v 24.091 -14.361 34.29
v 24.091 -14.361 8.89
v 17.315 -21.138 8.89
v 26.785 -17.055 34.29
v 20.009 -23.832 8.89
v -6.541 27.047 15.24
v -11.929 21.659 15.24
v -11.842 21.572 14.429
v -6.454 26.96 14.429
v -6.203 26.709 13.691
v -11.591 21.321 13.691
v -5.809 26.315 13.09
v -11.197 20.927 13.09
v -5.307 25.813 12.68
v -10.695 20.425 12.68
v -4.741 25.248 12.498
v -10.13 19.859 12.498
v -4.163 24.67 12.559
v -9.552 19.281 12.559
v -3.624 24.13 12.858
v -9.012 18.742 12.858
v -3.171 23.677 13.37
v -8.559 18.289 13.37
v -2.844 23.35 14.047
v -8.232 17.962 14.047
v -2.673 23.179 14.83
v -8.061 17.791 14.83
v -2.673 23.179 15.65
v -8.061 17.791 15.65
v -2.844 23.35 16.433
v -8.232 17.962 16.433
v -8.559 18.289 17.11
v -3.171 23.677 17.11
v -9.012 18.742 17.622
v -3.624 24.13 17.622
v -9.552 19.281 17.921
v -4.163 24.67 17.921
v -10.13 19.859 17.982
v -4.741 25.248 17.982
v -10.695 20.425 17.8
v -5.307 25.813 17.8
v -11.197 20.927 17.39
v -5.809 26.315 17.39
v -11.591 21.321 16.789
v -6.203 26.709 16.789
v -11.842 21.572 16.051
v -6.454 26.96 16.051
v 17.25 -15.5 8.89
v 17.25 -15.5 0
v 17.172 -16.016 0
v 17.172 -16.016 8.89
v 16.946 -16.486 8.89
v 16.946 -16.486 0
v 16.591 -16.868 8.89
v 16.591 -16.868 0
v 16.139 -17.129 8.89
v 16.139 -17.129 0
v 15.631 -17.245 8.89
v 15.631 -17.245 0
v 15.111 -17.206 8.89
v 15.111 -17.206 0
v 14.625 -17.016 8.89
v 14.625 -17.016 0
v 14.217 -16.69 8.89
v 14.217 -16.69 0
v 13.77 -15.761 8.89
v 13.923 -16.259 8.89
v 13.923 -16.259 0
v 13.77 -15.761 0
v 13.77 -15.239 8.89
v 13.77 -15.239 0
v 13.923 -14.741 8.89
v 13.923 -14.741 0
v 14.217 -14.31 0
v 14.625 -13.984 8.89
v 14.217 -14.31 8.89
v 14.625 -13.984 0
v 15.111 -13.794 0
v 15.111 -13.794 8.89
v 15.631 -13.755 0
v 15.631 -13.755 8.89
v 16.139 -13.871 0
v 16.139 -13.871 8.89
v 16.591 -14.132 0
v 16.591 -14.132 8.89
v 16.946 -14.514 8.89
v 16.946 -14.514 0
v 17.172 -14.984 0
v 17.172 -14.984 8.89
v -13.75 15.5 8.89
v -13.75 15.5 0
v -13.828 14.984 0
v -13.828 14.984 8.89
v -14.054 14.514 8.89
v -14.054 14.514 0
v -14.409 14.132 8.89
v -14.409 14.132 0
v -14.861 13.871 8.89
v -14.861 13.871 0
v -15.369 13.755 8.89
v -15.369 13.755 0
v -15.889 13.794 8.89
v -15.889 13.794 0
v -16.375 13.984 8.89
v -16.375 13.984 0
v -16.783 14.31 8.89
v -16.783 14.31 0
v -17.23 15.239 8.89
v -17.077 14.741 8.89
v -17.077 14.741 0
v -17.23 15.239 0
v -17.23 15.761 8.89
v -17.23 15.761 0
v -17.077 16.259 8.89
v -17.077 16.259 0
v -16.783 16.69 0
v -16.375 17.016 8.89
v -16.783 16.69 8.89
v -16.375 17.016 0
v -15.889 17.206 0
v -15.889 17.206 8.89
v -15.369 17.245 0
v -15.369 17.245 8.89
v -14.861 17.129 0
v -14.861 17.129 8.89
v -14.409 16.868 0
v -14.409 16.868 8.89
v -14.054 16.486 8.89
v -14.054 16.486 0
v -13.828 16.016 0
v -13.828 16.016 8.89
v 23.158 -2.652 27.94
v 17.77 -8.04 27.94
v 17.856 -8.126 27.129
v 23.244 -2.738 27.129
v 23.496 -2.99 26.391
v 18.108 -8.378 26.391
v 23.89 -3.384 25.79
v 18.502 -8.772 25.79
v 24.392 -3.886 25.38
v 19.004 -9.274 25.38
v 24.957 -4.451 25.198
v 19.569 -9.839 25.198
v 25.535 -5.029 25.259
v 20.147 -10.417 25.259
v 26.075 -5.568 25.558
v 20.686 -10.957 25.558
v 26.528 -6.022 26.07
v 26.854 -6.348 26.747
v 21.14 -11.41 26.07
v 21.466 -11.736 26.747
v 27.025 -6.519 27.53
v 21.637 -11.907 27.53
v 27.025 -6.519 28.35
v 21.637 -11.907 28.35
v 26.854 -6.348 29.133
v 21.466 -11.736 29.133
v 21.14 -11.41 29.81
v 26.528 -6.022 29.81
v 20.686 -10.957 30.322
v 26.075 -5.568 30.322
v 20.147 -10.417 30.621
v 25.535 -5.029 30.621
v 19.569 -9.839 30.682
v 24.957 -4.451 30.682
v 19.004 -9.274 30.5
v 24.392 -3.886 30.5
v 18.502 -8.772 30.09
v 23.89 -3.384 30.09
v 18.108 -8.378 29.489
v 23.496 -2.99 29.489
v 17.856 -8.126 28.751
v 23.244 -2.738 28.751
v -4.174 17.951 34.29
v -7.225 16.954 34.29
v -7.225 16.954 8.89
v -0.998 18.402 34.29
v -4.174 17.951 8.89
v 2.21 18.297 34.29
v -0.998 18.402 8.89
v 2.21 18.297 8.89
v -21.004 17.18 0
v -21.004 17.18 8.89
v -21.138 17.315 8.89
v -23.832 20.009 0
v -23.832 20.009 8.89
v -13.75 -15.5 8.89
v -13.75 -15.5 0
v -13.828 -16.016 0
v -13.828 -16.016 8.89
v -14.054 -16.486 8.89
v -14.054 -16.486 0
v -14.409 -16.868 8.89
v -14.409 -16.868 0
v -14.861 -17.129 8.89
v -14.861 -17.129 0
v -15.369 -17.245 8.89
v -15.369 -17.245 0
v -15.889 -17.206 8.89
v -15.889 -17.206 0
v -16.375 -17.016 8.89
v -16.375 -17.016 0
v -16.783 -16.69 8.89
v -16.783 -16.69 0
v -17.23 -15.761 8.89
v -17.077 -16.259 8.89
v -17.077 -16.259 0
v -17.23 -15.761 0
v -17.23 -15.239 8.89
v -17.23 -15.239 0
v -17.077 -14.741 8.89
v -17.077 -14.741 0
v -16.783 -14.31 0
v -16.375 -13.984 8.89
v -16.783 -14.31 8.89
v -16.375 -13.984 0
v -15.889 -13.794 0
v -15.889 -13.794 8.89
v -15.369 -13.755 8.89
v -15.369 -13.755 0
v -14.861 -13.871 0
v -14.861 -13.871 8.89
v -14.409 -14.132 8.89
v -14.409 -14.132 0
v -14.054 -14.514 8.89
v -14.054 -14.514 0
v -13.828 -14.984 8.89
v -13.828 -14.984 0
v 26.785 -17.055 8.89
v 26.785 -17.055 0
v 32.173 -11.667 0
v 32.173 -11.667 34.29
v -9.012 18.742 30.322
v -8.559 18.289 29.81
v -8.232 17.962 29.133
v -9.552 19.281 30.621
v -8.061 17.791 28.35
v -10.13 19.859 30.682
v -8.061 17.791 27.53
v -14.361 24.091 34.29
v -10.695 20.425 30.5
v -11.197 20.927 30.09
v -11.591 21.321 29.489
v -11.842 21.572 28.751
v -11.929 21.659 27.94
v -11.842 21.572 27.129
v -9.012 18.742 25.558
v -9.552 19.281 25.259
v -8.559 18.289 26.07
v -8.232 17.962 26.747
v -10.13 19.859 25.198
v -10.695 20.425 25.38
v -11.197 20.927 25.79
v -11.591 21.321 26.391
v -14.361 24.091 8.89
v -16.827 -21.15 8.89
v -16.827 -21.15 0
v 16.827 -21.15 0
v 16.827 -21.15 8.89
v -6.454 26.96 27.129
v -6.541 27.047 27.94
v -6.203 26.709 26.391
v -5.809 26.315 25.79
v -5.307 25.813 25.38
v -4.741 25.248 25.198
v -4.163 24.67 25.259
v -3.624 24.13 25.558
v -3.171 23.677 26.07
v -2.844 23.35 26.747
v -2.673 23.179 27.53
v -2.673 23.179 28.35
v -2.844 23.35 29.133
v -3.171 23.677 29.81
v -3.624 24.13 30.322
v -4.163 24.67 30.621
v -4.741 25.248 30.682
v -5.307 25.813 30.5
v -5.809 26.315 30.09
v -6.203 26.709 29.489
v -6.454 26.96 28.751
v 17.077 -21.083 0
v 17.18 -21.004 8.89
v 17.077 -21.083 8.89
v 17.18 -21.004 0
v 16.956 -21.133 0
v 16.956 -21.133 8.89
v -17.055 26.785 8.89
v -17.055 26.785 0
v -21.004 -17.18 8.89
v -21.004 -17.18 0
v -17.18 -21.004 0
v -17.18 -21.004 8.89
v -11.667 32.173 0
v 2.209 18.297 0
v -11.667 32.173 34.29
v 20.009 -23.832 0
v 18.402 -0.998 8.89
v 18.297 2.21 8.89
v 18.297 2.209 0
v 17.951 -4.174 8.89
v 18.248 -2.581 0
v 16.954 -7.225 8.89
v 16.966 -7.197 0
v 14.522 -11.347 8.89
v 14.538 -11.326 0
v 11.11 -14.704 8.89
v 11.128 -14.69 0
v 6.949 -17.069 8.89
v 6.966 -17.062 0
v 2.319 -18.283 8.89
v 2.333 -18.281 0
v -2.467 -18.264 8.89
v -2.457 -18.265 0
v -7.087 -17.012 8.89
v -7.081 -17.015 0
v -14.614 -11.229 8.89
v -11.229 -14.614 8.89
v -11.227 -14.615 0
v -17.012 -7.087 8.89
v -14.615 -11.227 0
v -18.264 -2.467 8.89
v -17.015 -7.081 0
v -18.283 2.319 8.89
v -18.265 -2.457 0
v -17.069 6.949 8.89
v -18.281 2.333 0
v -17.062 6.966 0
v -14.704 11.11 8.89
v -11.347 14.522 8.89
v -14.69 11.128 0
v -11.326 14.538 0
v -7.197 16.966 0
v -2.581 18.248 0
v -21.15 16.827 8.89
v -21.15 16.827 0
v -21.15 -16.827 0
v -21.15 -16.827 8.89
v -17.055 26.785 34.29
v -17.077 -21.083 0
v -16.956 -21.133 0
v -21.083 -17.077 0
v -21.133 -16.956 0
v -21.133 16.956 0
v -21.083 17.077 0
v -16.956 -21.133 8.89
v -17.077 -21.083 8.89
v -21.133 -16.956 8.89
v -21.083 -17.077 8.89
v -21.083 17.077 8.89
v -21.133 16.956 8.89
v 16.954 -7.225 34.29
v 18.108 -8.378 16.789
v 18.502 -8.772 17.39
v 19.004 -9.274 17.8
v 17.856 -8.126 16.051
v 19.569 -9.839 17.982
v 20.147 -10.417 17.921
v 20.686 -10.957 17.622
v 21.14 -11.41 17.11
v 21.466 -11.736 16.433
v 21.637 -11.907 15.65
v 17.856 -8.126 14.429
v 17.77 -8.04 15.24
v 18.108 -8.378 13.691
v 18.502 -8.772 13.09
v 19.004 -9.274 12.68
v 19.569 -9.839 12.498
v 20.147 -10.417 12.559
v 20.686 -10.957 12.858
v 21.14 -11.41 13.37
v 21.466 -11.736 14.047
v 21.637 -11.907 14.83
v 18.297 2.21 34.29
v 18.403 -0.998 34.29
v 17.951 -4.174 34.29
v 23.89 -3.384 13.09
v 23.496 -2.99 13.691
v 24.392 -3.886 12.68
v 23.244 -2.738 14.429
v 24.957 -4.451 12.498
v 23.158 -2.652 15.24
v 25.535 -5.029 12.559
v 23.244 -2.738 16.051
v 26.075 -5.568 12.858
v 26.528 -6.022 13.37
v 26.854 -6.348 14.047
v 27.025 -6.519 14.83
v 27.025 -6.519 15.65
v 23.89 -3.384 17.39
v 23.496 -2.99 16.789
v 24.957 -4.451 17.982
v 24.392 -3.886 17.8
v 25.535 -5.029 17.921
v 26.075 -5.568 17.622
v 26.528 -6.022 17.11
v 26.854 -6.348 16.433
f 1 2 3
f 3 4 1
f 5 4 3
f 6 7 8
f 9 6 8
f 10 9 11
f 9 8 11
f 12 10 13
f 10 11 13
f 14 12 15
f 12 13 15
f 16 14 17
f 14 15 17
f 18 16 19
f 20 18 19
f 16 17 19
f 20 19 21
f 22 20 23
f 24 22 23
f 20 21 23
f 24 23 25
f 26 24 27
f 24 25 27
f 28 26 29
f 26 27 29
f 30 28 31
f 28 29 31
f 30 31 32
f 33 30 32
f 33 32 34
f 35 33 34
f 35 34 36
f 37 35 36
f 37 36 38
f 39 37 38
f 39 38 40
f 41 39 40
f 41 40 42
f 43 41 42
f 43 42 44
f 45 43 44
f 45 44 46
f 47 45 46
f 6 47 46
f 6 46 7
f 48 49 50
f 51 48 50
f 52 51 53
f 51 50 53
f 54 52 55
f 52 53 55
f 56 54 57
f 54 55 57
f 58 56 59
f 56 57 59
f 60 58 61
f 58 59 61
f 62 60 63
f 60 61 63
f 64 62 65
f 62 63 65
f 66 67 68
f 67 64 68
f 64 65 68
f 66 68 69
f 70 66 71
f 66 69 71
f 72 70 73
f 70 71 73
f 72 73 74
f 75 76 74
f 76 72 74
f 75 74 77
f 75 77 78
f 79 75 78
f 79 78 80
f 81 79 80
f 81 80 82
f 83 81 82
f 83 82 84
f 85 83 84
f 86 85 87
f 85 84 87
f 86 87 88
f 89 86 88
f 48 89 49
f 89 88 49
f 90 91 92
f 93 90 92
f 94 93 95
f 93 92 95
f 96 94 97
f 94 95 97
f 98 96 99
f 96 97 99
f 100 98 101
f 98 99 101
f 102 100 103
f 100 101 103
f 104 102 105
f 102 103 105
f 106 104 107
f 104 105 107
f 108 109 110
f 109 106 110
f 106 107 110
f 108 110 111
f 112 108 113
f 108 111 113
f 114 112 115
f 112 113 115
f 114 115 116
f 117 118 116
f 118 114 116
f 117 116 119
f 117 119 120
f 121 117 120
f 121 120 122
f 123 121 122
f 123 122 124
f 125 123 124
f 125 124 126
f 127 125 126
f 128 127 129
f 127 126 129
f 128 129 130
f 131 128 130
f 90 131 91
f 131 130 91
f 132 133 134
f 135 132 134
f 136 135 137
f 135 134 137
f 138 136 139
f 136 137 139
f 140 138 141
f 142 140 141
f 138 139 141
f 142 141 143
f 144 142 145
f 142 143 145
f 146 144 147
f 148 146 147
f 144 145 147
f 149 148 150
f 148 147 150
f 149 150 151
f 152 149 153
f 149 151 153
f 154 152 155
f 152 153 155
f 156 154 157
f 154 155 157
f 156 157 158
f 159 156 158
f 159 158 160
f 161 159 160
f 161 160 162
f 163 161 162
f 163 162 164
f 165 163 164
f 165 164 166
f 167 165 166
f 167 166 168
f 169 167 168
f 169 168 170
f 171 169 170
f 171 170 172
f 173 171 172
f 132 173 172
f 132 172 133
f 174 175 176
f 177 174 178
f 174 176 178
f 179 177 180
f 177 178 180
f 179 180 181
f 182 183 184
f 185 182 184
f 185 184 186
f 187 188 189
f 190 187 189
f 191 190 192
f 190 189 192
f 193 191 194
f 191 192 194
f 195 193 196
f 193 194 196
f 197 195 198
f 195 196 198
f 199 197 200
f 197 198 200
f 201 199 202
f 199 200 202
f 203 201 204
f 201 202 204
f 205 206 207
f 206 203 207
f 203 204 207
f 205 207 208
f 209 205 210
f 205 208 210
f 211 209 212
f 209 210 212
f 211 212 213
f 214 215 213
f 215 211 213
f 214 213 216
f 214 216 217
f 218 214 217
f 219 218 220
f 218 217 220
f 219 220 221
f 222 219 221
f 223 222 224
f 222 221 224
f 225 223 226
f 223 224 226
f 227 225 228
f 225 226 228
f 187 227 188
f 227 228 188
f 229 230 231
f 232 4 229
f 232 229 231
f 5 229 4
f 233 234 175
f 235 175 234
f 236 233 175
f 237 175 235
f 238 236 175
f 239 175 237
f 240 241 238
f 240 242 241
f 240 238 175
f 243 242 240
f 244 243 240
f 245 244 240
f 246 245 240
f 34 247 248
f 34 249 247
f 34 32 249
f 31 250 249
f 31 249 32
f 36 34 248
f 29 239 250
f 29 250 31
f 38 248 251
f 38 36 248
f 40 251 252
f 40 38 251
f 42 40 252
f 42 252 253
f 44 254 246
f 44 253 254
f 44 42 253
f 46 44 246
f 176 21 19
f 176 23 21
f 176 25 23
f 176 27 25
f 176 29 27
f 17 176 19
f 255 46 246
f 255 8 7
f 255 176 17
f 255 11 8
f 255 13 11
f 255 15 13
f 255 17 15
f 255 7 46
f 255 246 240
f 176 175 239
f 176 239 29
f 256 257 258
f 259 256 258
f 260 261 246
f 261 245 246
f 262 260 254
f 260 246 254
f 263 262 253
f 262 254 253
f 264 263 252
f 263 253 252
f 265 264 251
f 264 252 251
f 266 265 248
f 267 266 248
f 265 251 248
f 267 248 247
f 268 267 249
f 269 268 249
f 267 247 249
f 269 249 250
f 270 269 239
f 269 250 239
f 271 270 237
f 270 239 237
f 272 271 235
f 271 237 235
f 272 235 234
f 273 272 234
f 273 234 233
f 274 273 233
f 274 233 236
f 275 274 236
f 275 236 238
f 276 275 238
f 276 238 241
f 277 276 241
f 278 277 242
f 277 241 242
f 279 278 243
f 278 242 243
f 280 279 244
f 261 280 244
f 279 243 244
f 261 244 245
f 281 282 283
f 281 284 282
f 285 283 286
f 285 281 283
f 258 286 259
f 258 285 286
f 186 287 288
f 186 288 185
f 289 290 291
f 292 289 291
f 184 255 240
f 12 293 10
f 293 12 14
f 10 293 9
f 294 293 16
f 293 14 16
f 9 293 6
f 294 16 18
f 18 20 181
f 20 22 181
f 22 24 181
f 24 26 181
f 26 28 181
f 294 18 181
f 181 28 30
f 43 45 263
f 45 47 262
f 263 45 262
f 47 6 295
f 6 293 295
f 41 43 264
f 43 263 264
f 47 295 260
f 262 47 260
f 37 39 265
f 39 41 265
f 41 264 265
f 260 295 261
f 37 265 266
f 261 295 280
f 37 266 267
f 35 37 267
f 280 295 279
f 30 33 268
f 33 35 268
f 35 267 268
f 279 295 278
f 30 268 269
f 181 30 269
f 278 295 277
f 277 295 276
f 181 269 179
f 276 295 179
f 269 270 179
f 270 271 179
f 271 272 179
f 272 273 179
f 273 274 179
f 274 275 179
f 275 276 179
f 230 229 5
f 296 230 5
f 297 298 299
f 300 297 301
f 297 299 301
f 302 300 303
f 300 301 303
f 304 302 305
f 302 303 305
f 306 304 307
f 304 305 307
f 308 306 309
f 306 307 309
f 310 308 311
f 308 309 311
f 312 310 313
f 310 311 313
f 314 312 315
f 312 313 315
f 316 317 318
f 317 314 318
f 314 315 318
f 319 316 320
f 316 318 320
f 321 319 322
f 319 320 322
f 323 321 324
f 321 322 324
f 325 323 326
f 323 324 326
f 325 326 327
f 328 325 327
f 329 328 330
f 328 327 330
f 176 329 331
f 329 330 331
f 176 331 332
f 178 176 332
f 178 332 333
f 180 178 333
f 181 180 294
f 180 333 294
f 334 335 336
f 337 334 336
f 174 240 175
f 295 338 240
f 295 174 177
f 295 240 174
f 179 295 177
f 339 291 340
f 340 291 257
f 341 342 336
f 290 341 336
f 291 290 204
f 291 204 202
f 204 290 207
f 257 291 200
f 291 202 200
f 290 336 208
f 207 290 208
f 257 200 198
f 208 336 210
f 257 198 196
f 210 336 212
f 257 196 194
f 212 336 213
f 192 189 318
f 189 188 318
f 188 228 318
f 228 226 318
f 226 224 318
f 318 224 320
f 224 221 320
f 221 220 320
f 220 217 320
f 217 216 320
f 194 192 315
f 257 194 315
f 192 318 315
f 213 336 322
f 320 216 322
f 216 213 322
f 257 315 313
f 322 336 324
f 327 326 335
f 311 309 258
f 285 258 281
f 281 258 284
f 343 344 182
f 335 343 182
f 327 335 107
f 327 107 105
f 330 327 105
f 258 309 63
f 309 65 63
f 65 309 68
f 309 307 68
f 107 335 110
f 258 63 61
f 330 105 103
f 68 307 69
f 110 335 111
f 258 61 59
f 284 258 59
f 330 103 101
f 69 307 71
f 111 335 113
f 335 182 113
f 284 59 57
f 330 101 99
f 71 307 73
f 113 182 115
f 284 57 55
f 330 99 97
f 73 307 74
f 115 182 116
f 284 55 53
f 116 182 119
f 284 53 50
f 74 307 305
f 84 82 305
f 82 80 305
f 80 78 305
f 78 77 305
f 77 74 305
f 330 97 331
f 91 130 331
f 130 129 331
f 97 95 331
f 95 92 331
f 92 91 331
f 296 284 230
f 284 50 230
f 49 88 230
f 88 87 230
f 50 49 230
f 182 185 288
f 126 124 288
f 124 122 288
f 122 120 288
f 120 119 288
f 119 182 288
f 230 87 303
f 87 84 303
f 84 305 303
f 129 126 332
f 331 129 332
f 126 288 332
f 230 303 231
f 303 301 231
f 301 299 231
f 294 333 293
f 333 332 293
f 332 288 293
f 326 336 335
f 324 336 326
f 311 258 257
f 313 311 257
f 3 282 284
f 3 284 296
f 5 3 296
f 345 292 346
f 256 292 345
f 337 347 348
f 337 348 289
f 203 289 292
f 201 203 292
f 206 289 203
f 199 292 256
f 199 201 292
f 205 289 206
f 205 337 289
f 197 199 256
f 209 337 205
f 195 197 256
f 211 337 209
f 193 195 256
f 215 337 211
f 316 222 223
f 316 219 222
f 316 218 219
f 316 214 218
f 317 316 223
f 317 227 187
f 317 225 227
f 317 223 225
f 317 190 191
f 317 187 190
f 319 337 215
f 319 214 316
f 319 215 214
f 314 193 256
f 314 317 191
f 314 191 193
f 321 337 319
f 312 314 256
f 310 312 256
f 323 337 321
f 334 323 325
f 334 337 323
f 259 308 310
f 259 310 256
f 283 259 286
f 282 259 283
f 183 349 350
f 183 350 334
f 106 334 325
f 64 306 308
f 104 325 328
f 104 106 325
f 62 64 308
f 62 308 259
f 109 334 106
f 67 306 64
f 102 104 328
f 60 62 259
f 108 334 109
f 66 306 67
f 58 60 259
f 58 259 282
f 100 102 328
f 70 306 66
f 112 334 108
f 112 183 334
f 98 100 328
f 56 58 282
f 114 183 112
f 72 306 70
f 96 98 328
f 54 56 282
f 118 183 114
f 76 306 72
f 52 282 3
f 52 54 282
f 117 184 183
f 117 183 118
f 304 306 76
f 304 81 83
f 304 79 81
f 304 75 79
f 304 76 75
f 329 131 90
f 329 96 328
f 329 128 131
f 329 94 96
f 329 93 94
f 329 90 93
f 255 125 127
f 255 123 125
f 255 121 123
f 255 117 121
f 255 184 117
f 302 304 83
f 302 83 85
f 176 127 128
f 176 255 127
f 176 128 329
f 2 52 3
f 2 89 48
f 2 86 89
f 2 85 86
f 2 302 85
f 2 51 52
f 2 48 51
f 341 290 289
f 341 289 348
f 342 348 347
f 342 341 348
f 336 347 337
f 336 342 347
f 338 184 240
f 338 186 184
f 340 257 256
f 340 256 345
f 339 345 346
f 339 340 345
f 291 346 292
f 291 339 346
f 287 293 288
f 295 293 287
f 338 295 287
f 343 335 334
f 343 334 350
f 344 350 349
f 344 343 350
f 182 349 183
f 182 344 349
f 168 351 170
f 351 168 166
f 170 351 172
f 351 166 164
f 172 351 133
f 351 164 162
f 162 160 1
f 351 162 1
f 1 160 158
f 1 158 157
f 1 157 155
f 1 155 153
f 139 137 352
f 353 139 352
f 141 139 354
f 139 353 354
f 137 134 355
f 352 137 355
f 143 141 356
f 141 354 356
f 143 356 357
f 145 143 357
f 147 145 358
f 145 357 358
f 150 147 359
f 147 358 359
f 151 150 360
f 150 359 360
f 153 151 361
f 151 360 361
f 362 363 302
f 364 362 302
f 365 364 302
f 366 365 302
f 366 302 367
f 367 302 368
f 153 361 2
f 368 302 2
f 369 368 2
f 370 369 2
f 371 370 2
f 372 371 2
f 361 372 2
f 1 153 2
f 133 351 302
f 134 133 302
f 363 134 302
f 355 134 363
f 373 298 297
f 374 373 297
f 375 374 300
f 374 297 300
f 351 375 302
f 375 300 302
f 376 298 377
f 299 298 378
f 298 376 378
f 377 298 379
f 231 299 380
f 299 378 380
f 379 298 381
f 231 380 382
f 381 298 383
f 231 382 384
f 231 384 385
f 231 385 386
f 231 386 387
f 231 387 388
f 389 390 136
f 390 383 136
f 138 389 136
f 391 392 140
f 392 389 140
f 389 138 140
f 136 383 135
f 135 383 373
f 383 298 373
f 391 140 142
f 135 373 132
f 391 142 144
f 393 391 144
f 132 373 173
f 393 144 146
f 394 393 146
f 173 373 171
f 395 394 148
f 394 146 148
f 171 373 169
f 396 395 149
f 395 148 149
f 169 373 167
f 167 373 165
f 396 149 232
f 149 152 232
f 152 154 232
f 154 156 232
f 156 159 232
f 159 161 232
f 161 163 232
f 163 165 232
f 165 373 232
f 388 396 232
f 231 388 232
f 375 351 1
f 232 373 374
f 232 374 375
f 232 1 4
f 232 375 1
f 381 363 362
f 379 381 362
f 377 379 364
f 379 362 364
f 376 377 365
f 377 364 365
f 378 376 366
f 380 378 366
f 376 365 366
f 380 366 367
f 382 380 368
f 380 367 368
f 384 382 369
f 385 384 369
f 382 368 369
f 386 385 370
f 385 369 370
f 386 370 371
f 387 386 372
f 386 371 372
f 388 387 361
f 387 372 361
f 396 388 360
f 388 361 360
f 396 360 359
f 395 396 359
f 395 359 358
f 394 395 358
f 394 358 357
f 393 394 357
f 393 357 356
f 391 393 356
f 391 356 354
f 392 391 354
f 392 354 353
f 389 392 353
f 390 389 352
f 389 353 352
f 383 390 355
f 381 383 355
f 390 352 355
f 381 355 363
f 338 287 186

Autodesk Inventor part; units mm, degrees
ref_plane "YZ Plane" through (0, 0, 0) normal (1, 0, 0) x (0, 1, 0)
ref_plane "XZ Plane" through (0, 0, 0) normal (0, 1, 0) x (-1, 0, 0)
ref_plane "XY Plane" through (0, 0, 0) normal (0, 0, 1) x (1, 0, 0)
sketch "Sketch1" plane through (0, 0, 0) normal (0, 0, 1) x (1, 0, 0)
  line L0 (-21.15, 16.8267) -> (-21.15, -16.8267) projected
  arc A0 (-21.15, -16.8267) -> (-21.0036, -17.1802) centre (-20.65, -16.8267) ccw projected
  line L1 (-21.0036, -17.1802) -> (-17.1802, -21.0036) projected
  arc A1 (-17.1802, -21.0036) -> (-16.8267, -21.15) centre (-16.8267, -20.65) ccw projected
  line L2 (-16.8267, -21.15) -> (16.8267, -21.15) projected
  arc A2 (16.8267, -21.15) -> (17.1802, -21.0036) centre (16.8267, -20.65) ccw projected
  line L3 (17.1802, -21.0036) -> (21.0036, -17.1802) projected
  arc A3 (21.0036, -17.1802) -> (21.15, -16.8267) centre (20.65, -16.8267) ccw projected
  line L4 (21.15, -16.8267) -> (21.15, 16.8267) projected
  arc A4 (21.15, 16.8267) -> (21.0036, 17.1802) centre (20.65, 16.8267) ccw projected
  line L5 (21.0036, 17.1802) -> (17.1802, 21.0036) projected
  arc A5 (17.1802, 21.0036) -> (16.8267, 21.15) centre (16.8267, 20.65) ccw projected
  line L6 (16.8267, 21.15) -> (-16.8267, 21.15) projected
  arc A6 (-16.8267, 21.15) -> (-17.1802, 21.0036) centre (-16.8267, 20.65) ccw projected
  line L7 (-17.1802, 21.0036) -> (-21.0036, 17.1802) projected
  arc A7 (-21.0036, 17.1802) -> (-21.15, 16.8267) centre (-20.65, 16.8267) ccw projected
  circle A8 centre (-15.5, -15.5) radius 1.75 projected
  circle A9 centre (-15.5, 15.5) radius 1.75 projected
  circle A10 centre (15.5, 15.5) radius 1.75 projected
  circle A11 centre (15.5, -15.5) radius 1.75 projected
  circle A12 centre (0, 0) radius 17 projected
  circle A13 centre (0, 0) radius 18.4295
extrude "Extrusion1" add sketch "Sketch1" along normal blind 8.89 contours A7 L7 A6 L6 A5 L5 A4 L4 A3 L3 A2 L2 A1 L1 A0 L0
sketch "Sketch2" plane through (0, 0, 8.89) normal (0, 0, 1) x (1, 0, 0)
  circle A0 centre (0, 0) radius 18.4295 projected
  circle A1 centre (15.5, -15.5) radius 1.75 projected
  circle A2 centre (15.5, 15.5) radius 1.75 projected
  circle A3 centre (-15.5, 15.5) radius 1.75 projected
  circle A4 centre (-15.5, -15.5) radius 1.75 projected
  line L0 (-21.15, 16.8267) -> (-21.15, -16.8267) projected
  arc A5 (-21.15, -16.8267) -> (-21.0036, -17.1802) centre (-20.65, -16.8267) ccw projected
  line L1 (-21.0036, -17.1802) -> (-17.1802, -21.0036) projected
  arc A6 (-17.1802, -21.0036) -> (-16.8267, -21.15) centre (-16.8267, -20.65) ccw projected
  line L2 (-16.8267, -21.15) -> (16.8267, -21.15) projected
  arc A7 (16.8267, -21.15) -> (17.1802, -21.0036) centre (16.8267, -20.65) ccw projected
  line L3 (17.1802, -21.0036) -> (21.0036, -17.1802) projected
  arc A8 (21.0036, -17.1802) -> (21.15, -16.8267) centre (20.65, -16.8267) ccw projected
  line L4 (21.15, -16.8267) -> (21.15, 16.8267) projected
  arc A9 (21.15, 16.8267) -> (21.0036, 17.1802) centre (20.65, 16.8267) ccw projected
  line L5 (21.0036, 17.1802) -> (17.1802, 21.0036) projected
  arc A10 (17.1802, 21.0036) -> (16.8267, 21.15) centre (16.8267, 20.65) ccw projected
  line L6 (16.8267, 21.15) -> (-16.8267, 21.15) projected
  arc A11 (-16.8267, 21.15) -> (-17.1802, 21.0036) centre (-16.8267, 20.65) ccw projected
  line L7 (-17.1802, 21.0036) -> (-21.0036, 17.1802) projected
  arc A12 (-21.0036, 17.1802) -> (-21.15, 16.8267) centre (-20.65, 16.8267) ccw projected
  arc A13 (15.7331, 31.2895) -> (15.7331, 33.0572) centre (14.8492, 32.1734) ccw projected
  line L8 (15.7331, 33.0572) -> (12.0915, 36.6988) projected
  line L9 (12.0915, 36.6988) -> (11.3844, 36.6988) projected
  line L10 (11.3844, 36.6988) -> (10.6066, 35.921) projected
  line L11 (10.6066, 35.921) -> (12.3037, 34.224) projected
  line L12 (12.3037, 34.224) -> (10.9361, 32.8564) projected
  line L13 (10.9361, 32.8564) -> (7.5901, 32.8564) projected
  line L14 (7.5901, 32.8564) -> (3.1579, 37.2886) projected
  line L15 (3.1579, 37.2886) -> (3.1579, 40.6346) projected
  line L16 (3.1579, 40.6346) -> (4.5255, 42.0021) projected
  line L17 (4.5255, 42.0021) -> (6.2225, 40.3051) projected
  line L18 (6.2225, 40.3051) -> (7.0004, 41.0829) projected
  line L19 (7.0004, 41.0829) -> (7.0004, 41.79) projected
  line L20 (7.0004, 41.79) -> (3.3588, 45.4316) projected
  arc A14 (3.3588, 45.4316) -> (1.591, 45.4316) centre (2.4749, 44.5477) ccw projected
  line L21 (1.591, 45.4316) -> (-2.0506, 41.79) projected
  line L22 (-2.0506, 41.79) -> (-2.0506, 41.0829) projected
  line L23 (-2.0506, 41.0829) -> (-1.2728, 40.3051) projected
  line L24 (-1.2728, 40.3051) -> (0.4243, 42.0021) projected
  line L25 (0.4243, 42.0021) -> (1.7918, 40.6346) projected
  line L26 (1.7918, 40.6346) -> (1.7918, 37.2886) projected
  line L27 (1.7918, 37.2886) -> (-2.6403, 32.8564) projected
  line L28 (-2.6403, 32.8564) -> (-5.9864, 32.8564) projected
  line L29 (-5.9864, 32.8564) -> (-7.3539, 34.224) projected
  line L30 (-7.3539, 34.224) -> (-5.6569, 35.921) projected
  line L31 (-5.6569, 35.921) -> (-6.4347, 36.6988) projected
  line L32 (-6.4347, 36.6988) -> (-7.1418, 36.6988) projected
  line L33 (-7.1418, 36.6988) -> (-10.7834, 33.0572) projected
  arc A15 (-10.7834, 33.0572) -> (-10.7834, 31.2895) centre (-9.8995, 32.1734) ccw projected
  line L34 (-10.7834, 31.2895) -> (-7.1418, 27.6479) projected
  line L35 (-7.1418, 27.6479) -> (-6.4347, 27.6479) projected
  line L36 (-6.4347, 27.6479) -> (-5.6569, 28.4257) projected
  line L37 (-5.6569, 28.4257) -> (-7.3539, 30.1228) projected
  line L38 (-7.3539, 30.1228) -> (-5.9864, 31.4903) projected
  line L39 (-5.9864, 31.4903) -> (-2.6403, 31.4903) projected
  line L40 (-2.6403, 31.4903) -> (1.7918, 27.0582) projected
  line L41 (1.7918, 27.0582) -> (1.7918, 23.7121) projected
  line L42 (1.7918, 23.7121) -> (0.4243, 22.3446) projected
  line L43 (0.4243, 22.3446) -> (-1.2728, 24.0416) projected
  line L44 (-1.2728, 24.0416) -> (-2.0506, 23.2638) projected
  line L45 (-2.0506, 23.2638) -> (-2.0506, 22.5567) projected
  line L46 (-2.0506, 22.5567) -> (1.591, 18.9151) projected
  arc A16 (1.591, 18.9151) -> (3.3588, 18.9151) centre (2.4749, 19.799) ccw projected
  line L47 (3.3588, 18.9151) -> (7.0004, 22.5567) projected
  line L48 (7.0004, 22.5567) -> (7.0004, 23.2638) projected
  line L49 (7.0004, 23.2638) -> (6.2225, 24.0416) projected
  line L50 (6.2225, 24.0416) -> (4.5255, 22.3446) projected
  line L51 (4.5255, 22.3446) -> (3.1579, 23.7121) projected
  line L52 (3.1579, 23.7121) -> (3.1579, 27.0582) projected
  line L53 (3.1579, 27.0582) -> (7.5901, 31.4903) projected
  line L54 (7.5901, 31.4903) -> (10.9361, 31.4903) projected
  line L55 (10.9361, 31.4903) -> (12.3037, 30.1228) projected
  line L56 (12.3037, 30.1228) -> (10.6066, 28.4257) projected
  line L57 (10.6066, 28.4257) -> (11.3844, 27.6479) projected
  line L58 (11.3844, 27.6479) -> (12.0915, 27.6479) projected
  line L59 (12.0915, 27.6479) -> (15.7331, 31.2895) projected
  circle A17 centre (2.4749, 32.1734) radius 2.5 projected
  arc A18 (45.4316, 1.591) -> (45.4316, 3.3588) centre (44.5477, 2.4749) ccw projected
  line L60 (45.4316, 3.3588) -> (41.79, 7.0004) projected
  line L61 (41.79, 7.0004) -> (41.0829, 7.0004) projected
  line L62 (41.0829, 7.0004) -> (40.3051, 6.2225) projected
  line L63 (40.3051, 6.2225) -> (42.0021, 4.5255) projected
  line L64 (42.0021, 4.5255) -> (40.6346, 3.158) projected
  line L65 (40.6346, 3.158) -> (37.2886, 3.158) projected
  line L66 (37.2886, 3.158) -> (32.8564, 7.5901) projected
  line L67 (32.8564, 7.5901) -> (32.8564, 10.9361) projected
  line L68 (32.8564, 10.9361) -> (34.224, 12.3037) projected
  line L69 (34.224, 12.3037) -> (35.921, 10.6066) projected
  line L70 (35.921, 10.6066) -> (36.6988, 11.3844) projected
  line L71 (36.6988, 11.3844) -> (36.6988, 12.0915) projected
  line L72 (36.6988, 12.0915) -> (33.0572, 15.7331) projected
  arc A19 (33.0572, 15.7331) -> (31.2895, 15.7331) centre (32.1734, 14.8492) ccw projected
  line L73 (31.2895, 15.7331) -> (27.6479, 12.0915) projected
  line L74 (27.6479, 12.0915) -> (27.6479, 11.3844) projected
  line L75 (27.6479, 11.3844) -> (28.4257, 10.6066) projected
  line L76 (28.4257, 10.6066) -> (30.1227, 12.3037) projected
  line L77 (30.1227, 12.3037) -> (31.4903, 10.9361) projected
  line L78 (31.4903, 10.9361) -> (31.4903, 7.5901) projected
  line L79 (31.4903, 7.5901) -> (27.0582, 3.158) projected
  line L80 (27.0582, 3.158) -> (23.7121, 3.158) projected
  line L81 (23.7121, 3.158) -> (22.3446, 4.5255) projected
  line L82 (22.3446, 4.5255) -> (24.0416, 6.2225) projected
  line L83 (24.0416, 6.2225) -> (23.2638, 7.0004) projected
  line L84 (23.2638, 7.0004) -> (22.5567, 7.0004) projected
  line L85 (22.5567, 7.0004) -> (18.9151, 3.3588) projected
  arc A20 (18.9151, 3.3588) -> (18.9151, 1.591) centre (19.799, 2.4749) ccw projected
  line L86 (18.9151, 1.591) -> (22.5567, -2.0506) projected
  line L87 (22.5567, -2.0506) -> (23.2638, -2.0506) projected
  line L88 (23.2638, -2.0506) -> (24.0416, -1.2728) projected
  line L89 (24.0416, -1.2728) -> (22.3446, 0.4243) projected
  line L90 (22.3446, 0.4243) -> (23.7121, 1.7918) projected
  line L91 (23.7121, 1.7918) -> (27.0582, 1.7918) projected
  line L92 (27.0582, 1.7918) -> (31.4903, -2.6403) projected
  line L93 (31.4903, -2.6403) -> (31.4903, -5.9864) projected
  line L94 (31.4903, -5.9864) -> (30.1227, -7.3539) projected
  line L95 (30.1227, -7.3539) -> (28.4257, -5.6569) projected
  line L96 (28.4257, -5.6569) -> (27.6479, -6.4347) projected
  line L97 (27.6479, -6.4347) -> (27.6479, -7.1418) projected
  line L98 (27.6479, -7.1418) -> (31.2895, -10.7834) projected
  arc A21 (31.2895, -10.7834) -> (33.0572, -10.7834) centre (32.1734, -9.8995) ccw projected
  line L99 (33.0572, -10.7834) -> (36.6988, -7.1418) projected
  line L100 (36.6988, -7.1418) -> (36.6988, -6.4347) projected
  line L101 (36.6988, -6.4347) -> (35.921, -5.6569) projected
  line L102 (35.921, -5.6569) -> (34.224, -7.3539) projected
  line L103 (34.224, -7.3539) -> (32.8564, -5.9864) projected
  line L104 (32.8564, -5.9864) -> (32.8564, -2.6403) projected
  line L105 (32.8564, -2.6403) -> (37.2886, 1.7918) projected
  line L106 (37.2886, 1.7918) -> (40.6346, 1.7918) projected
  line L107 (40.6346, 1.7918) -> (42.0021, 0.4243) projected
  line L108 (42.0021, 0.4243) -> (40.3051, -1.2728) projected
  line L109 (40.3051, -1.2728) -> (41.0829, -2.0506) projected
  line L110 (41.0829, -2.0506) -> (41.79, -2.0506) projected
  line L111 (41.79, -2.0506) -> (45.4316, 1.591) projected
  circle A22 centre (32.1734, 2.4749) radius 2.5 projected
  line L112 (0, 0) -> (0, 42.5275)
  line L113 (17.1802, -21.0036) -> (21.0036, -17.1802) projected
  line L114 (17.1802, -21.0036) -> (32.1734, -11.6673)
  line L115 (32.1734, -11.6673) -> (21.15, -0.6439)
  line L116 (21.15, -16.8267) -> (21.15, 16.8267) projected
  line L117 (21.15, -0.6439) -> (17.1802, -21.0036)
  line L118 (0, 0) -> (48.328, 48.328)
  line L119 (-21.0036, 17.1802) -> (-11.6673, 32.1734)
  line L120 (-11.6673, 32.1734) -> (-0.6439, 21.15)
  line L121 (-0.6439, 21.15) -> (-21.0036, 17.1802)
extrude "Extrusion2" add sketch "Sketch2" against normal up to surface (8.89 mm away) contours L121 L7 A11 L6 | L6 A11 L7 L119 L120 L34 L46 | L86 L115 L98 L114 L3 A8 L4 | L4 A8 L3 L117
sketch "Sketch3" plane through (0, 0, 8.89) normal (0, 0, 1) x (1, 0, 0)
  arc A0 (-21.0036, 17.1802) -> (-21.15, 16.8267) centre (-20.65, 16.8267) ccw projected
  line L0 (-21.15, 16.8267) -> (-21.15, -16.8267) projected
  arc A1 (-21.15, -16.8267) -> (-21.0036, -17.1802) centre (-20.65, -16.8267) ccw projected
  line L1 (-21.0036, -17.1802) -> (-17.1802, -21.0036) projected
  arc A2 (-17.1802, -21.0036) -> (-16.8267, -21.15) centre (-16.8267, -20.65) ccw projected
  line L2 (-16.8267, -21.15) -> (16.8267, -21.15) projected
  arc A3 (16.8267, -21.15) -> (17.1802, -21.0036) centre (16.8267, -20.65) ccw projected
  line L3 (17.1802, -21.0036) -> (32.1734, -11.6673) projected
  line L4 (32.1734, -11.6673) -> (21.15, -0.6439) projected
  line L5 (21.15, -0.6439) -> (21.15, 16.8267) projected
  arc A4 (21.15, 16.8267) -> (21.0036, 17.1802) centre (20.65, 16.8267) ccw projected
  line L6 (21.0036, 17.1802) -> (17.1802, 21.0036) projected
  arc A5 (17.1802, 21.0036) -> (16.8267, 21.15) centre (16.8267, 20.65) ccw projected
  line L7 (16.8267, 21.15) -> (-0.6439, 21.15) projected
  line L8 (-0.6439, 21.15) -> (-11.6673, 32.1734) projected
  line L9 (-11.6673, 32.1734) -> (-21.0036, 17.1802) projected
  circle A6 centre (0, 0) radius 18.4295 projected
  circle A7 centre (15.5, -15.5) radius 1.75 projected
  circle A8 centre (15.5, 15.5) radius 1.75 projected
  circle A9 centre (-15.5, 15.5) radius 1.75 projected
  circle A10 centre (-15.5, -15.5) radius 1.75 projected
  line L10 (21.15, -0.6439) -> (32.1734, -11.6673) projected
  line L11 (32.1734, -11.6673) -> (18.0312, 2.4749)
  line L12 (18.0312, 2.4749) -> (12.6431, -2.9133)
  line L13 (12.6431, -2.9133) -> (26.7852, -17.0554)
  line L14 (26.7852, -17.0554) -> (32.1734, -11.6673)
  line L15 (0, 0) -> (-64.6298, -64.6298)
  line L16 (-11.6673, 32.1734) -> (-0.6439, 21.15)
  line L17 (-0.6439, 21.15) -> (-11.6673, 32.1734)
  line L18 (-11.6673, 32.1734) -> (2.4749, 18.0312)
  line L19 (2.4749, 18.0312) -> (-2.9133, 12.6431)
  line L20 (-2.9133, 12.6431) -> (-17.0554, 26.7852)
  line L21 (-17.0554, 26.7852) -> (-11.6673, 32.1734)
  dimension "d5" = 7.62
  dimension "d6" = 20
extrude "Extrusion3" add sketch "Sketch3" along normal blind 25.4 contours L20 L21 L9 | L9 L8 L18 A6 L20 | A6 L18 L19 L20 | L11 L4 L3 L13 A6 | A6 L13 L12 L11 | L3 L14 L13
sketch "Sketch4" plane through (0, 0, 8.89) normal (0, 0, 1) x (1, 0, 0)
  line L0 (-7.2246, 16.9544) -> (-15.8026, 25.5324) projected
  line L1 (-15.8026, 25.5324) -> (-21.0036, 17.1802) projected
  arc A0 (-21.0036, 17.1802) -> (-21.15, 16.8267) centre (-20.65, 16.8267) ccw projected
  line L2 (-21.15, 16.8267) -> (-21.15, -16.8267) projected
  arc A1 (-21.15, -16.8267) -> (-21.0036, -17.1802) centre (-20.65, -16.8267) ccw projected
  line L3 (-21.0036, -17.1802) -> (-17.1802, -21.0036) projected
  arc A2 (-17.1802, -21.0036) -> (-16.8267, -21.15) centre (-16.8267, -20.65) ccw projected
  line L4 (-16.8267, -21.15) -> (16.8267, -21.15) projected
  arc A3 (16.8267, -21.15) -> (17.1802, -21.0036) centre (16.8267, -20.65) ccw projected
  line L5 (17.1802, -21.0036) -> (25.5324, -15.8026) projected
  line L6 (25.5324, -15.8026) -> (16.9544, -7.2246) projected
  arc A4 (-7.2246, 16.9544) -> (16.9544, -7.2246) centre (0, 0) ccw projected
  circle A5 centre (15.5, -15.5) radius 1.75 projected
  circle A6 centre (-15.5, 15.5) radius 1.75 projected
  circle A7 centre (-15.5, -15.5) radius 1.75 projected
  line L7 (25.5324, -15.8026) -> (32.1734, -11.6673) projected
  line L8 (32.1734, -11.6673) -> (18.0312, 2.4749) projected
  line L9 (18.0312, 2.4749) -> (12.6431, -2.9133) projected
  line L10 (12.6431, -2.9133) -> (26.7852, -17.0554) projected
  line L11 (26.7852, -17.0554) -> (32.1734, -11.6673) projected
  line L12 (-11.6673, 32.1734) -> (-17.0554, 26.7852) projected
  line L13 (-17.0554, 26.7852) -> (-2.9133, 12.6431) projected
  line L14 (-2.9133, 12.6431) -> (2.4749, 18.0312) projected
  line L15 (2.4749, 18.0312) -> (-11.6673, 32.1734) projected
  line L16 (17.1802, -21.0036) -> (20.0086, -23.832)
  line L17 (21.15, -0.6439) -> (32.1734, -11.6673) projected
  line L18 (32.1734, -11.6673) -> (20.0086, -23.832)
  line L19 (32.1734, -11.6673) -> (17.1802, -21.0036) projected
  line L20 (17.1802, -21.0036) -> (32.1734, -11.6673)
  line L21 (0, 0) -> (-37.9127, -37.9127)
  arc A8 (-21.0036, 17.1802) -> (-21.15, 16.8267) centre (-20.65, 16.8267) ccw
  line L22 (-21.0036, 17.1802) -> (-15.8026, 25.5324)
  line L23 (-15.8026, 25.5324) -> (-11.6673, 32.1734)
  line L24 (-17.0554, 26.7852) -> (-11.6673, 32.1734)
  line L25 (-21.0036, 17.1802) -> (-23.832, 20.0086)
  line L26 (-11.6673, 32.1734) -> (-23.832, 20.0086)
  line L27 (-11.6673, 32.1734) -> (-21.0036, 17.1802)
  line L28 (-21.0036, 17.1802) -> (-11.6673, 32.1734)
extrude "Extrusion4" add sketch "Sketch4" against normal up to surface (8.89 mm away) contours L1 L25 L26 L13 | L13 L12 L23 | L10 L18 L16 L5 | L7 L11 L10
sketch "Sketch5" plane through (0, 0, 8.89) normal (0, 0, 1) x (1, 0, 0)
  circle A0 centre (15.5, 15.5) radius 1.75 projected
  line L0 (-0.6439, 21.15) -> (2.2095, 18.2966) projected
  arc A1 (18.2966, 2.2095) -> (2.2095, 18.2966) centre (0, 0) ccw projected
  line L1 (18.2966, 2.2095) -> (21.15, -0.6439) projected
  line L2 (21.15, -0.6439) -> (21.15, 16.8267) projected
  arc A2 (21.15, 16.8267) -> (21.0036, 17.1802) centre (20.65, 16.8267) ccw projected
  line L3 (21.0036, 17.1802) -> (17.1802, 21.0036) projected
  arc A3 (17.1802, 21.0036) -> (16.8267, 21.15) centre (16.8267, 20.65) ccw projected
  line L4 (16.8267, 21.15) -> (-0.6439, 21.15) projected
extrude "Extrusion5" cut sketch "Sketch5" against normal blind 25.4
sketch "Sketch6" plane through (32.1734, -11.6673, 34.29) normal (0.7071068, -0.7071068, 0) x (-0.7071068, -0.7071068, 0)
  line L0 (0, 34.29) -> (0, 0) projected
  line L1 (7.62, 0) -> (0, 0) projected
  line L2 (7.62, 25.4) -> (7.62, 0) projected
  line L3 (17.2035, 25.4) -> (7.62, 25.4) projected
  line L4 (17.2035, 25.4) -> (17.2035, 34.29) projected
  line L5 (0, 34.29) -> (17.2035, 34.29) projected
  line L6 (7.62, 25.4) -> (7.62, 0) projected
  line L7 (7.62, 0) -> (17.2035, 25.4)
  line L8 (32.9295, 25.4) -> (7.62, 25.4) projected
  line L9 (17.2035, 25.4) -> (7.62, 25.4)
  line L10 (0, 0) -> (7.62, 0) projected
  line L11 (7.62, 25.4) -> (7.62, 0)
  point P0 (14.5, 34.29)
extrude "Extrusion6" add sketch "Sketch6" against normal blind 3.81 contours L2 L3 L7
sketch "Sketch7" plane through (-11.6673, 32.1734, 0) normal (-0.7071068, 0.7071068, 0) x (-0.7071068, -0.7071068, 0)
  line L0 (17.2035, 8.89) -> (7.62, 34.29) projected
  line L1 (7.62, 8.89) -> (7.62, 34.29) projected
  line L2 (17.2035, 8.89) -> (7.62, 8.89) projected
  point P0 (14.5, 0)
extrude "Extrusion7" add sketch "Sketch7" against normal blind 3.81
sketch "Sketch8" plane through (12.6431, -2.9133, 34.29) normal (-0.7071068, -0.7071068, 0) x (-0.7071068, 0.7071068, 0)
  line L0 (-20, 0) -> (-20, 25.4) projected
  line L1 (0, 25.4) -> (0, 0) projected
  line L2 (22, 25.4) -> (22, 0) projected
  line L3 (42, 25.4) -> (42, 0) projected
  line L4 (22, 12.7) -> (42, 12.7) construction
  line L5 (42, 34.29) -> (42, 0) projected
  line L6 (-20, 12.7) -> (0, 12.7) construction
  line L7 (-10, 12.7) -> (-10, 0) construction
  line L8 (-20, 0) -> (0, 0) projected
  line L9 (32, 12.7) -> (32, 0) construction
  line L10 (22, 0) -> (42, 0) projected
  line L11 (32, 12.7) -> (32, 25.4) construction
  line L12 (31.1703, 34.29) -> (31.1703, 25.4) projected
  line L13 (-10, 12.7) -> (-10, 25.4) construction
  circle A0 centre (-10, 19.05) radius 2.75
  circle A1 centre (-10, 6.35) radius 2.75
  circle A2 centre (32, 6.35) radius 2.75
  circle A3 centre (32, 19.05) radius 2.75
  point P0 (11, 34.29)
  dimension "d17" = 5.5
extrude "Extrusion8" cut sketch "Sketch8" against normal through all
sketch "Sketch9" plane through (0, 0, 8.89) normal (0, 0, -1) x (-1, 0, 0)
  arc A0 (-18.2966, 2.2095) -> (-16.9544, -7.2246) centre (0, 0) ccw projected
  line L0 (-12.6431, -2.9133) -> (-16.9544, -7.2246) projected
  line L1 (-18.0312, 2.4749) -> (-12.6431, -2.9133) projected
  line L2 (-18.2966, 2.2095) -> (-18.0312, 2.4749) projected
  arc A1 (7.2246, 16.9544) -> (-2.2095, 18.2966) centre (0, 0) ccw projected
  line L3 (-2.4749, 18.0312) -> (-2.2095, 18.2966) projected
  line L4 (2.9133, 12.6431) -> (-2.4749, 18.0312) projected
  line L5 (7.2246, 16.9544) -> (2.9133, 12.6431) projected
extrude "Extrusion9" cut sketch "Sketch9" against normal through all
properties part number "ZHolder"
